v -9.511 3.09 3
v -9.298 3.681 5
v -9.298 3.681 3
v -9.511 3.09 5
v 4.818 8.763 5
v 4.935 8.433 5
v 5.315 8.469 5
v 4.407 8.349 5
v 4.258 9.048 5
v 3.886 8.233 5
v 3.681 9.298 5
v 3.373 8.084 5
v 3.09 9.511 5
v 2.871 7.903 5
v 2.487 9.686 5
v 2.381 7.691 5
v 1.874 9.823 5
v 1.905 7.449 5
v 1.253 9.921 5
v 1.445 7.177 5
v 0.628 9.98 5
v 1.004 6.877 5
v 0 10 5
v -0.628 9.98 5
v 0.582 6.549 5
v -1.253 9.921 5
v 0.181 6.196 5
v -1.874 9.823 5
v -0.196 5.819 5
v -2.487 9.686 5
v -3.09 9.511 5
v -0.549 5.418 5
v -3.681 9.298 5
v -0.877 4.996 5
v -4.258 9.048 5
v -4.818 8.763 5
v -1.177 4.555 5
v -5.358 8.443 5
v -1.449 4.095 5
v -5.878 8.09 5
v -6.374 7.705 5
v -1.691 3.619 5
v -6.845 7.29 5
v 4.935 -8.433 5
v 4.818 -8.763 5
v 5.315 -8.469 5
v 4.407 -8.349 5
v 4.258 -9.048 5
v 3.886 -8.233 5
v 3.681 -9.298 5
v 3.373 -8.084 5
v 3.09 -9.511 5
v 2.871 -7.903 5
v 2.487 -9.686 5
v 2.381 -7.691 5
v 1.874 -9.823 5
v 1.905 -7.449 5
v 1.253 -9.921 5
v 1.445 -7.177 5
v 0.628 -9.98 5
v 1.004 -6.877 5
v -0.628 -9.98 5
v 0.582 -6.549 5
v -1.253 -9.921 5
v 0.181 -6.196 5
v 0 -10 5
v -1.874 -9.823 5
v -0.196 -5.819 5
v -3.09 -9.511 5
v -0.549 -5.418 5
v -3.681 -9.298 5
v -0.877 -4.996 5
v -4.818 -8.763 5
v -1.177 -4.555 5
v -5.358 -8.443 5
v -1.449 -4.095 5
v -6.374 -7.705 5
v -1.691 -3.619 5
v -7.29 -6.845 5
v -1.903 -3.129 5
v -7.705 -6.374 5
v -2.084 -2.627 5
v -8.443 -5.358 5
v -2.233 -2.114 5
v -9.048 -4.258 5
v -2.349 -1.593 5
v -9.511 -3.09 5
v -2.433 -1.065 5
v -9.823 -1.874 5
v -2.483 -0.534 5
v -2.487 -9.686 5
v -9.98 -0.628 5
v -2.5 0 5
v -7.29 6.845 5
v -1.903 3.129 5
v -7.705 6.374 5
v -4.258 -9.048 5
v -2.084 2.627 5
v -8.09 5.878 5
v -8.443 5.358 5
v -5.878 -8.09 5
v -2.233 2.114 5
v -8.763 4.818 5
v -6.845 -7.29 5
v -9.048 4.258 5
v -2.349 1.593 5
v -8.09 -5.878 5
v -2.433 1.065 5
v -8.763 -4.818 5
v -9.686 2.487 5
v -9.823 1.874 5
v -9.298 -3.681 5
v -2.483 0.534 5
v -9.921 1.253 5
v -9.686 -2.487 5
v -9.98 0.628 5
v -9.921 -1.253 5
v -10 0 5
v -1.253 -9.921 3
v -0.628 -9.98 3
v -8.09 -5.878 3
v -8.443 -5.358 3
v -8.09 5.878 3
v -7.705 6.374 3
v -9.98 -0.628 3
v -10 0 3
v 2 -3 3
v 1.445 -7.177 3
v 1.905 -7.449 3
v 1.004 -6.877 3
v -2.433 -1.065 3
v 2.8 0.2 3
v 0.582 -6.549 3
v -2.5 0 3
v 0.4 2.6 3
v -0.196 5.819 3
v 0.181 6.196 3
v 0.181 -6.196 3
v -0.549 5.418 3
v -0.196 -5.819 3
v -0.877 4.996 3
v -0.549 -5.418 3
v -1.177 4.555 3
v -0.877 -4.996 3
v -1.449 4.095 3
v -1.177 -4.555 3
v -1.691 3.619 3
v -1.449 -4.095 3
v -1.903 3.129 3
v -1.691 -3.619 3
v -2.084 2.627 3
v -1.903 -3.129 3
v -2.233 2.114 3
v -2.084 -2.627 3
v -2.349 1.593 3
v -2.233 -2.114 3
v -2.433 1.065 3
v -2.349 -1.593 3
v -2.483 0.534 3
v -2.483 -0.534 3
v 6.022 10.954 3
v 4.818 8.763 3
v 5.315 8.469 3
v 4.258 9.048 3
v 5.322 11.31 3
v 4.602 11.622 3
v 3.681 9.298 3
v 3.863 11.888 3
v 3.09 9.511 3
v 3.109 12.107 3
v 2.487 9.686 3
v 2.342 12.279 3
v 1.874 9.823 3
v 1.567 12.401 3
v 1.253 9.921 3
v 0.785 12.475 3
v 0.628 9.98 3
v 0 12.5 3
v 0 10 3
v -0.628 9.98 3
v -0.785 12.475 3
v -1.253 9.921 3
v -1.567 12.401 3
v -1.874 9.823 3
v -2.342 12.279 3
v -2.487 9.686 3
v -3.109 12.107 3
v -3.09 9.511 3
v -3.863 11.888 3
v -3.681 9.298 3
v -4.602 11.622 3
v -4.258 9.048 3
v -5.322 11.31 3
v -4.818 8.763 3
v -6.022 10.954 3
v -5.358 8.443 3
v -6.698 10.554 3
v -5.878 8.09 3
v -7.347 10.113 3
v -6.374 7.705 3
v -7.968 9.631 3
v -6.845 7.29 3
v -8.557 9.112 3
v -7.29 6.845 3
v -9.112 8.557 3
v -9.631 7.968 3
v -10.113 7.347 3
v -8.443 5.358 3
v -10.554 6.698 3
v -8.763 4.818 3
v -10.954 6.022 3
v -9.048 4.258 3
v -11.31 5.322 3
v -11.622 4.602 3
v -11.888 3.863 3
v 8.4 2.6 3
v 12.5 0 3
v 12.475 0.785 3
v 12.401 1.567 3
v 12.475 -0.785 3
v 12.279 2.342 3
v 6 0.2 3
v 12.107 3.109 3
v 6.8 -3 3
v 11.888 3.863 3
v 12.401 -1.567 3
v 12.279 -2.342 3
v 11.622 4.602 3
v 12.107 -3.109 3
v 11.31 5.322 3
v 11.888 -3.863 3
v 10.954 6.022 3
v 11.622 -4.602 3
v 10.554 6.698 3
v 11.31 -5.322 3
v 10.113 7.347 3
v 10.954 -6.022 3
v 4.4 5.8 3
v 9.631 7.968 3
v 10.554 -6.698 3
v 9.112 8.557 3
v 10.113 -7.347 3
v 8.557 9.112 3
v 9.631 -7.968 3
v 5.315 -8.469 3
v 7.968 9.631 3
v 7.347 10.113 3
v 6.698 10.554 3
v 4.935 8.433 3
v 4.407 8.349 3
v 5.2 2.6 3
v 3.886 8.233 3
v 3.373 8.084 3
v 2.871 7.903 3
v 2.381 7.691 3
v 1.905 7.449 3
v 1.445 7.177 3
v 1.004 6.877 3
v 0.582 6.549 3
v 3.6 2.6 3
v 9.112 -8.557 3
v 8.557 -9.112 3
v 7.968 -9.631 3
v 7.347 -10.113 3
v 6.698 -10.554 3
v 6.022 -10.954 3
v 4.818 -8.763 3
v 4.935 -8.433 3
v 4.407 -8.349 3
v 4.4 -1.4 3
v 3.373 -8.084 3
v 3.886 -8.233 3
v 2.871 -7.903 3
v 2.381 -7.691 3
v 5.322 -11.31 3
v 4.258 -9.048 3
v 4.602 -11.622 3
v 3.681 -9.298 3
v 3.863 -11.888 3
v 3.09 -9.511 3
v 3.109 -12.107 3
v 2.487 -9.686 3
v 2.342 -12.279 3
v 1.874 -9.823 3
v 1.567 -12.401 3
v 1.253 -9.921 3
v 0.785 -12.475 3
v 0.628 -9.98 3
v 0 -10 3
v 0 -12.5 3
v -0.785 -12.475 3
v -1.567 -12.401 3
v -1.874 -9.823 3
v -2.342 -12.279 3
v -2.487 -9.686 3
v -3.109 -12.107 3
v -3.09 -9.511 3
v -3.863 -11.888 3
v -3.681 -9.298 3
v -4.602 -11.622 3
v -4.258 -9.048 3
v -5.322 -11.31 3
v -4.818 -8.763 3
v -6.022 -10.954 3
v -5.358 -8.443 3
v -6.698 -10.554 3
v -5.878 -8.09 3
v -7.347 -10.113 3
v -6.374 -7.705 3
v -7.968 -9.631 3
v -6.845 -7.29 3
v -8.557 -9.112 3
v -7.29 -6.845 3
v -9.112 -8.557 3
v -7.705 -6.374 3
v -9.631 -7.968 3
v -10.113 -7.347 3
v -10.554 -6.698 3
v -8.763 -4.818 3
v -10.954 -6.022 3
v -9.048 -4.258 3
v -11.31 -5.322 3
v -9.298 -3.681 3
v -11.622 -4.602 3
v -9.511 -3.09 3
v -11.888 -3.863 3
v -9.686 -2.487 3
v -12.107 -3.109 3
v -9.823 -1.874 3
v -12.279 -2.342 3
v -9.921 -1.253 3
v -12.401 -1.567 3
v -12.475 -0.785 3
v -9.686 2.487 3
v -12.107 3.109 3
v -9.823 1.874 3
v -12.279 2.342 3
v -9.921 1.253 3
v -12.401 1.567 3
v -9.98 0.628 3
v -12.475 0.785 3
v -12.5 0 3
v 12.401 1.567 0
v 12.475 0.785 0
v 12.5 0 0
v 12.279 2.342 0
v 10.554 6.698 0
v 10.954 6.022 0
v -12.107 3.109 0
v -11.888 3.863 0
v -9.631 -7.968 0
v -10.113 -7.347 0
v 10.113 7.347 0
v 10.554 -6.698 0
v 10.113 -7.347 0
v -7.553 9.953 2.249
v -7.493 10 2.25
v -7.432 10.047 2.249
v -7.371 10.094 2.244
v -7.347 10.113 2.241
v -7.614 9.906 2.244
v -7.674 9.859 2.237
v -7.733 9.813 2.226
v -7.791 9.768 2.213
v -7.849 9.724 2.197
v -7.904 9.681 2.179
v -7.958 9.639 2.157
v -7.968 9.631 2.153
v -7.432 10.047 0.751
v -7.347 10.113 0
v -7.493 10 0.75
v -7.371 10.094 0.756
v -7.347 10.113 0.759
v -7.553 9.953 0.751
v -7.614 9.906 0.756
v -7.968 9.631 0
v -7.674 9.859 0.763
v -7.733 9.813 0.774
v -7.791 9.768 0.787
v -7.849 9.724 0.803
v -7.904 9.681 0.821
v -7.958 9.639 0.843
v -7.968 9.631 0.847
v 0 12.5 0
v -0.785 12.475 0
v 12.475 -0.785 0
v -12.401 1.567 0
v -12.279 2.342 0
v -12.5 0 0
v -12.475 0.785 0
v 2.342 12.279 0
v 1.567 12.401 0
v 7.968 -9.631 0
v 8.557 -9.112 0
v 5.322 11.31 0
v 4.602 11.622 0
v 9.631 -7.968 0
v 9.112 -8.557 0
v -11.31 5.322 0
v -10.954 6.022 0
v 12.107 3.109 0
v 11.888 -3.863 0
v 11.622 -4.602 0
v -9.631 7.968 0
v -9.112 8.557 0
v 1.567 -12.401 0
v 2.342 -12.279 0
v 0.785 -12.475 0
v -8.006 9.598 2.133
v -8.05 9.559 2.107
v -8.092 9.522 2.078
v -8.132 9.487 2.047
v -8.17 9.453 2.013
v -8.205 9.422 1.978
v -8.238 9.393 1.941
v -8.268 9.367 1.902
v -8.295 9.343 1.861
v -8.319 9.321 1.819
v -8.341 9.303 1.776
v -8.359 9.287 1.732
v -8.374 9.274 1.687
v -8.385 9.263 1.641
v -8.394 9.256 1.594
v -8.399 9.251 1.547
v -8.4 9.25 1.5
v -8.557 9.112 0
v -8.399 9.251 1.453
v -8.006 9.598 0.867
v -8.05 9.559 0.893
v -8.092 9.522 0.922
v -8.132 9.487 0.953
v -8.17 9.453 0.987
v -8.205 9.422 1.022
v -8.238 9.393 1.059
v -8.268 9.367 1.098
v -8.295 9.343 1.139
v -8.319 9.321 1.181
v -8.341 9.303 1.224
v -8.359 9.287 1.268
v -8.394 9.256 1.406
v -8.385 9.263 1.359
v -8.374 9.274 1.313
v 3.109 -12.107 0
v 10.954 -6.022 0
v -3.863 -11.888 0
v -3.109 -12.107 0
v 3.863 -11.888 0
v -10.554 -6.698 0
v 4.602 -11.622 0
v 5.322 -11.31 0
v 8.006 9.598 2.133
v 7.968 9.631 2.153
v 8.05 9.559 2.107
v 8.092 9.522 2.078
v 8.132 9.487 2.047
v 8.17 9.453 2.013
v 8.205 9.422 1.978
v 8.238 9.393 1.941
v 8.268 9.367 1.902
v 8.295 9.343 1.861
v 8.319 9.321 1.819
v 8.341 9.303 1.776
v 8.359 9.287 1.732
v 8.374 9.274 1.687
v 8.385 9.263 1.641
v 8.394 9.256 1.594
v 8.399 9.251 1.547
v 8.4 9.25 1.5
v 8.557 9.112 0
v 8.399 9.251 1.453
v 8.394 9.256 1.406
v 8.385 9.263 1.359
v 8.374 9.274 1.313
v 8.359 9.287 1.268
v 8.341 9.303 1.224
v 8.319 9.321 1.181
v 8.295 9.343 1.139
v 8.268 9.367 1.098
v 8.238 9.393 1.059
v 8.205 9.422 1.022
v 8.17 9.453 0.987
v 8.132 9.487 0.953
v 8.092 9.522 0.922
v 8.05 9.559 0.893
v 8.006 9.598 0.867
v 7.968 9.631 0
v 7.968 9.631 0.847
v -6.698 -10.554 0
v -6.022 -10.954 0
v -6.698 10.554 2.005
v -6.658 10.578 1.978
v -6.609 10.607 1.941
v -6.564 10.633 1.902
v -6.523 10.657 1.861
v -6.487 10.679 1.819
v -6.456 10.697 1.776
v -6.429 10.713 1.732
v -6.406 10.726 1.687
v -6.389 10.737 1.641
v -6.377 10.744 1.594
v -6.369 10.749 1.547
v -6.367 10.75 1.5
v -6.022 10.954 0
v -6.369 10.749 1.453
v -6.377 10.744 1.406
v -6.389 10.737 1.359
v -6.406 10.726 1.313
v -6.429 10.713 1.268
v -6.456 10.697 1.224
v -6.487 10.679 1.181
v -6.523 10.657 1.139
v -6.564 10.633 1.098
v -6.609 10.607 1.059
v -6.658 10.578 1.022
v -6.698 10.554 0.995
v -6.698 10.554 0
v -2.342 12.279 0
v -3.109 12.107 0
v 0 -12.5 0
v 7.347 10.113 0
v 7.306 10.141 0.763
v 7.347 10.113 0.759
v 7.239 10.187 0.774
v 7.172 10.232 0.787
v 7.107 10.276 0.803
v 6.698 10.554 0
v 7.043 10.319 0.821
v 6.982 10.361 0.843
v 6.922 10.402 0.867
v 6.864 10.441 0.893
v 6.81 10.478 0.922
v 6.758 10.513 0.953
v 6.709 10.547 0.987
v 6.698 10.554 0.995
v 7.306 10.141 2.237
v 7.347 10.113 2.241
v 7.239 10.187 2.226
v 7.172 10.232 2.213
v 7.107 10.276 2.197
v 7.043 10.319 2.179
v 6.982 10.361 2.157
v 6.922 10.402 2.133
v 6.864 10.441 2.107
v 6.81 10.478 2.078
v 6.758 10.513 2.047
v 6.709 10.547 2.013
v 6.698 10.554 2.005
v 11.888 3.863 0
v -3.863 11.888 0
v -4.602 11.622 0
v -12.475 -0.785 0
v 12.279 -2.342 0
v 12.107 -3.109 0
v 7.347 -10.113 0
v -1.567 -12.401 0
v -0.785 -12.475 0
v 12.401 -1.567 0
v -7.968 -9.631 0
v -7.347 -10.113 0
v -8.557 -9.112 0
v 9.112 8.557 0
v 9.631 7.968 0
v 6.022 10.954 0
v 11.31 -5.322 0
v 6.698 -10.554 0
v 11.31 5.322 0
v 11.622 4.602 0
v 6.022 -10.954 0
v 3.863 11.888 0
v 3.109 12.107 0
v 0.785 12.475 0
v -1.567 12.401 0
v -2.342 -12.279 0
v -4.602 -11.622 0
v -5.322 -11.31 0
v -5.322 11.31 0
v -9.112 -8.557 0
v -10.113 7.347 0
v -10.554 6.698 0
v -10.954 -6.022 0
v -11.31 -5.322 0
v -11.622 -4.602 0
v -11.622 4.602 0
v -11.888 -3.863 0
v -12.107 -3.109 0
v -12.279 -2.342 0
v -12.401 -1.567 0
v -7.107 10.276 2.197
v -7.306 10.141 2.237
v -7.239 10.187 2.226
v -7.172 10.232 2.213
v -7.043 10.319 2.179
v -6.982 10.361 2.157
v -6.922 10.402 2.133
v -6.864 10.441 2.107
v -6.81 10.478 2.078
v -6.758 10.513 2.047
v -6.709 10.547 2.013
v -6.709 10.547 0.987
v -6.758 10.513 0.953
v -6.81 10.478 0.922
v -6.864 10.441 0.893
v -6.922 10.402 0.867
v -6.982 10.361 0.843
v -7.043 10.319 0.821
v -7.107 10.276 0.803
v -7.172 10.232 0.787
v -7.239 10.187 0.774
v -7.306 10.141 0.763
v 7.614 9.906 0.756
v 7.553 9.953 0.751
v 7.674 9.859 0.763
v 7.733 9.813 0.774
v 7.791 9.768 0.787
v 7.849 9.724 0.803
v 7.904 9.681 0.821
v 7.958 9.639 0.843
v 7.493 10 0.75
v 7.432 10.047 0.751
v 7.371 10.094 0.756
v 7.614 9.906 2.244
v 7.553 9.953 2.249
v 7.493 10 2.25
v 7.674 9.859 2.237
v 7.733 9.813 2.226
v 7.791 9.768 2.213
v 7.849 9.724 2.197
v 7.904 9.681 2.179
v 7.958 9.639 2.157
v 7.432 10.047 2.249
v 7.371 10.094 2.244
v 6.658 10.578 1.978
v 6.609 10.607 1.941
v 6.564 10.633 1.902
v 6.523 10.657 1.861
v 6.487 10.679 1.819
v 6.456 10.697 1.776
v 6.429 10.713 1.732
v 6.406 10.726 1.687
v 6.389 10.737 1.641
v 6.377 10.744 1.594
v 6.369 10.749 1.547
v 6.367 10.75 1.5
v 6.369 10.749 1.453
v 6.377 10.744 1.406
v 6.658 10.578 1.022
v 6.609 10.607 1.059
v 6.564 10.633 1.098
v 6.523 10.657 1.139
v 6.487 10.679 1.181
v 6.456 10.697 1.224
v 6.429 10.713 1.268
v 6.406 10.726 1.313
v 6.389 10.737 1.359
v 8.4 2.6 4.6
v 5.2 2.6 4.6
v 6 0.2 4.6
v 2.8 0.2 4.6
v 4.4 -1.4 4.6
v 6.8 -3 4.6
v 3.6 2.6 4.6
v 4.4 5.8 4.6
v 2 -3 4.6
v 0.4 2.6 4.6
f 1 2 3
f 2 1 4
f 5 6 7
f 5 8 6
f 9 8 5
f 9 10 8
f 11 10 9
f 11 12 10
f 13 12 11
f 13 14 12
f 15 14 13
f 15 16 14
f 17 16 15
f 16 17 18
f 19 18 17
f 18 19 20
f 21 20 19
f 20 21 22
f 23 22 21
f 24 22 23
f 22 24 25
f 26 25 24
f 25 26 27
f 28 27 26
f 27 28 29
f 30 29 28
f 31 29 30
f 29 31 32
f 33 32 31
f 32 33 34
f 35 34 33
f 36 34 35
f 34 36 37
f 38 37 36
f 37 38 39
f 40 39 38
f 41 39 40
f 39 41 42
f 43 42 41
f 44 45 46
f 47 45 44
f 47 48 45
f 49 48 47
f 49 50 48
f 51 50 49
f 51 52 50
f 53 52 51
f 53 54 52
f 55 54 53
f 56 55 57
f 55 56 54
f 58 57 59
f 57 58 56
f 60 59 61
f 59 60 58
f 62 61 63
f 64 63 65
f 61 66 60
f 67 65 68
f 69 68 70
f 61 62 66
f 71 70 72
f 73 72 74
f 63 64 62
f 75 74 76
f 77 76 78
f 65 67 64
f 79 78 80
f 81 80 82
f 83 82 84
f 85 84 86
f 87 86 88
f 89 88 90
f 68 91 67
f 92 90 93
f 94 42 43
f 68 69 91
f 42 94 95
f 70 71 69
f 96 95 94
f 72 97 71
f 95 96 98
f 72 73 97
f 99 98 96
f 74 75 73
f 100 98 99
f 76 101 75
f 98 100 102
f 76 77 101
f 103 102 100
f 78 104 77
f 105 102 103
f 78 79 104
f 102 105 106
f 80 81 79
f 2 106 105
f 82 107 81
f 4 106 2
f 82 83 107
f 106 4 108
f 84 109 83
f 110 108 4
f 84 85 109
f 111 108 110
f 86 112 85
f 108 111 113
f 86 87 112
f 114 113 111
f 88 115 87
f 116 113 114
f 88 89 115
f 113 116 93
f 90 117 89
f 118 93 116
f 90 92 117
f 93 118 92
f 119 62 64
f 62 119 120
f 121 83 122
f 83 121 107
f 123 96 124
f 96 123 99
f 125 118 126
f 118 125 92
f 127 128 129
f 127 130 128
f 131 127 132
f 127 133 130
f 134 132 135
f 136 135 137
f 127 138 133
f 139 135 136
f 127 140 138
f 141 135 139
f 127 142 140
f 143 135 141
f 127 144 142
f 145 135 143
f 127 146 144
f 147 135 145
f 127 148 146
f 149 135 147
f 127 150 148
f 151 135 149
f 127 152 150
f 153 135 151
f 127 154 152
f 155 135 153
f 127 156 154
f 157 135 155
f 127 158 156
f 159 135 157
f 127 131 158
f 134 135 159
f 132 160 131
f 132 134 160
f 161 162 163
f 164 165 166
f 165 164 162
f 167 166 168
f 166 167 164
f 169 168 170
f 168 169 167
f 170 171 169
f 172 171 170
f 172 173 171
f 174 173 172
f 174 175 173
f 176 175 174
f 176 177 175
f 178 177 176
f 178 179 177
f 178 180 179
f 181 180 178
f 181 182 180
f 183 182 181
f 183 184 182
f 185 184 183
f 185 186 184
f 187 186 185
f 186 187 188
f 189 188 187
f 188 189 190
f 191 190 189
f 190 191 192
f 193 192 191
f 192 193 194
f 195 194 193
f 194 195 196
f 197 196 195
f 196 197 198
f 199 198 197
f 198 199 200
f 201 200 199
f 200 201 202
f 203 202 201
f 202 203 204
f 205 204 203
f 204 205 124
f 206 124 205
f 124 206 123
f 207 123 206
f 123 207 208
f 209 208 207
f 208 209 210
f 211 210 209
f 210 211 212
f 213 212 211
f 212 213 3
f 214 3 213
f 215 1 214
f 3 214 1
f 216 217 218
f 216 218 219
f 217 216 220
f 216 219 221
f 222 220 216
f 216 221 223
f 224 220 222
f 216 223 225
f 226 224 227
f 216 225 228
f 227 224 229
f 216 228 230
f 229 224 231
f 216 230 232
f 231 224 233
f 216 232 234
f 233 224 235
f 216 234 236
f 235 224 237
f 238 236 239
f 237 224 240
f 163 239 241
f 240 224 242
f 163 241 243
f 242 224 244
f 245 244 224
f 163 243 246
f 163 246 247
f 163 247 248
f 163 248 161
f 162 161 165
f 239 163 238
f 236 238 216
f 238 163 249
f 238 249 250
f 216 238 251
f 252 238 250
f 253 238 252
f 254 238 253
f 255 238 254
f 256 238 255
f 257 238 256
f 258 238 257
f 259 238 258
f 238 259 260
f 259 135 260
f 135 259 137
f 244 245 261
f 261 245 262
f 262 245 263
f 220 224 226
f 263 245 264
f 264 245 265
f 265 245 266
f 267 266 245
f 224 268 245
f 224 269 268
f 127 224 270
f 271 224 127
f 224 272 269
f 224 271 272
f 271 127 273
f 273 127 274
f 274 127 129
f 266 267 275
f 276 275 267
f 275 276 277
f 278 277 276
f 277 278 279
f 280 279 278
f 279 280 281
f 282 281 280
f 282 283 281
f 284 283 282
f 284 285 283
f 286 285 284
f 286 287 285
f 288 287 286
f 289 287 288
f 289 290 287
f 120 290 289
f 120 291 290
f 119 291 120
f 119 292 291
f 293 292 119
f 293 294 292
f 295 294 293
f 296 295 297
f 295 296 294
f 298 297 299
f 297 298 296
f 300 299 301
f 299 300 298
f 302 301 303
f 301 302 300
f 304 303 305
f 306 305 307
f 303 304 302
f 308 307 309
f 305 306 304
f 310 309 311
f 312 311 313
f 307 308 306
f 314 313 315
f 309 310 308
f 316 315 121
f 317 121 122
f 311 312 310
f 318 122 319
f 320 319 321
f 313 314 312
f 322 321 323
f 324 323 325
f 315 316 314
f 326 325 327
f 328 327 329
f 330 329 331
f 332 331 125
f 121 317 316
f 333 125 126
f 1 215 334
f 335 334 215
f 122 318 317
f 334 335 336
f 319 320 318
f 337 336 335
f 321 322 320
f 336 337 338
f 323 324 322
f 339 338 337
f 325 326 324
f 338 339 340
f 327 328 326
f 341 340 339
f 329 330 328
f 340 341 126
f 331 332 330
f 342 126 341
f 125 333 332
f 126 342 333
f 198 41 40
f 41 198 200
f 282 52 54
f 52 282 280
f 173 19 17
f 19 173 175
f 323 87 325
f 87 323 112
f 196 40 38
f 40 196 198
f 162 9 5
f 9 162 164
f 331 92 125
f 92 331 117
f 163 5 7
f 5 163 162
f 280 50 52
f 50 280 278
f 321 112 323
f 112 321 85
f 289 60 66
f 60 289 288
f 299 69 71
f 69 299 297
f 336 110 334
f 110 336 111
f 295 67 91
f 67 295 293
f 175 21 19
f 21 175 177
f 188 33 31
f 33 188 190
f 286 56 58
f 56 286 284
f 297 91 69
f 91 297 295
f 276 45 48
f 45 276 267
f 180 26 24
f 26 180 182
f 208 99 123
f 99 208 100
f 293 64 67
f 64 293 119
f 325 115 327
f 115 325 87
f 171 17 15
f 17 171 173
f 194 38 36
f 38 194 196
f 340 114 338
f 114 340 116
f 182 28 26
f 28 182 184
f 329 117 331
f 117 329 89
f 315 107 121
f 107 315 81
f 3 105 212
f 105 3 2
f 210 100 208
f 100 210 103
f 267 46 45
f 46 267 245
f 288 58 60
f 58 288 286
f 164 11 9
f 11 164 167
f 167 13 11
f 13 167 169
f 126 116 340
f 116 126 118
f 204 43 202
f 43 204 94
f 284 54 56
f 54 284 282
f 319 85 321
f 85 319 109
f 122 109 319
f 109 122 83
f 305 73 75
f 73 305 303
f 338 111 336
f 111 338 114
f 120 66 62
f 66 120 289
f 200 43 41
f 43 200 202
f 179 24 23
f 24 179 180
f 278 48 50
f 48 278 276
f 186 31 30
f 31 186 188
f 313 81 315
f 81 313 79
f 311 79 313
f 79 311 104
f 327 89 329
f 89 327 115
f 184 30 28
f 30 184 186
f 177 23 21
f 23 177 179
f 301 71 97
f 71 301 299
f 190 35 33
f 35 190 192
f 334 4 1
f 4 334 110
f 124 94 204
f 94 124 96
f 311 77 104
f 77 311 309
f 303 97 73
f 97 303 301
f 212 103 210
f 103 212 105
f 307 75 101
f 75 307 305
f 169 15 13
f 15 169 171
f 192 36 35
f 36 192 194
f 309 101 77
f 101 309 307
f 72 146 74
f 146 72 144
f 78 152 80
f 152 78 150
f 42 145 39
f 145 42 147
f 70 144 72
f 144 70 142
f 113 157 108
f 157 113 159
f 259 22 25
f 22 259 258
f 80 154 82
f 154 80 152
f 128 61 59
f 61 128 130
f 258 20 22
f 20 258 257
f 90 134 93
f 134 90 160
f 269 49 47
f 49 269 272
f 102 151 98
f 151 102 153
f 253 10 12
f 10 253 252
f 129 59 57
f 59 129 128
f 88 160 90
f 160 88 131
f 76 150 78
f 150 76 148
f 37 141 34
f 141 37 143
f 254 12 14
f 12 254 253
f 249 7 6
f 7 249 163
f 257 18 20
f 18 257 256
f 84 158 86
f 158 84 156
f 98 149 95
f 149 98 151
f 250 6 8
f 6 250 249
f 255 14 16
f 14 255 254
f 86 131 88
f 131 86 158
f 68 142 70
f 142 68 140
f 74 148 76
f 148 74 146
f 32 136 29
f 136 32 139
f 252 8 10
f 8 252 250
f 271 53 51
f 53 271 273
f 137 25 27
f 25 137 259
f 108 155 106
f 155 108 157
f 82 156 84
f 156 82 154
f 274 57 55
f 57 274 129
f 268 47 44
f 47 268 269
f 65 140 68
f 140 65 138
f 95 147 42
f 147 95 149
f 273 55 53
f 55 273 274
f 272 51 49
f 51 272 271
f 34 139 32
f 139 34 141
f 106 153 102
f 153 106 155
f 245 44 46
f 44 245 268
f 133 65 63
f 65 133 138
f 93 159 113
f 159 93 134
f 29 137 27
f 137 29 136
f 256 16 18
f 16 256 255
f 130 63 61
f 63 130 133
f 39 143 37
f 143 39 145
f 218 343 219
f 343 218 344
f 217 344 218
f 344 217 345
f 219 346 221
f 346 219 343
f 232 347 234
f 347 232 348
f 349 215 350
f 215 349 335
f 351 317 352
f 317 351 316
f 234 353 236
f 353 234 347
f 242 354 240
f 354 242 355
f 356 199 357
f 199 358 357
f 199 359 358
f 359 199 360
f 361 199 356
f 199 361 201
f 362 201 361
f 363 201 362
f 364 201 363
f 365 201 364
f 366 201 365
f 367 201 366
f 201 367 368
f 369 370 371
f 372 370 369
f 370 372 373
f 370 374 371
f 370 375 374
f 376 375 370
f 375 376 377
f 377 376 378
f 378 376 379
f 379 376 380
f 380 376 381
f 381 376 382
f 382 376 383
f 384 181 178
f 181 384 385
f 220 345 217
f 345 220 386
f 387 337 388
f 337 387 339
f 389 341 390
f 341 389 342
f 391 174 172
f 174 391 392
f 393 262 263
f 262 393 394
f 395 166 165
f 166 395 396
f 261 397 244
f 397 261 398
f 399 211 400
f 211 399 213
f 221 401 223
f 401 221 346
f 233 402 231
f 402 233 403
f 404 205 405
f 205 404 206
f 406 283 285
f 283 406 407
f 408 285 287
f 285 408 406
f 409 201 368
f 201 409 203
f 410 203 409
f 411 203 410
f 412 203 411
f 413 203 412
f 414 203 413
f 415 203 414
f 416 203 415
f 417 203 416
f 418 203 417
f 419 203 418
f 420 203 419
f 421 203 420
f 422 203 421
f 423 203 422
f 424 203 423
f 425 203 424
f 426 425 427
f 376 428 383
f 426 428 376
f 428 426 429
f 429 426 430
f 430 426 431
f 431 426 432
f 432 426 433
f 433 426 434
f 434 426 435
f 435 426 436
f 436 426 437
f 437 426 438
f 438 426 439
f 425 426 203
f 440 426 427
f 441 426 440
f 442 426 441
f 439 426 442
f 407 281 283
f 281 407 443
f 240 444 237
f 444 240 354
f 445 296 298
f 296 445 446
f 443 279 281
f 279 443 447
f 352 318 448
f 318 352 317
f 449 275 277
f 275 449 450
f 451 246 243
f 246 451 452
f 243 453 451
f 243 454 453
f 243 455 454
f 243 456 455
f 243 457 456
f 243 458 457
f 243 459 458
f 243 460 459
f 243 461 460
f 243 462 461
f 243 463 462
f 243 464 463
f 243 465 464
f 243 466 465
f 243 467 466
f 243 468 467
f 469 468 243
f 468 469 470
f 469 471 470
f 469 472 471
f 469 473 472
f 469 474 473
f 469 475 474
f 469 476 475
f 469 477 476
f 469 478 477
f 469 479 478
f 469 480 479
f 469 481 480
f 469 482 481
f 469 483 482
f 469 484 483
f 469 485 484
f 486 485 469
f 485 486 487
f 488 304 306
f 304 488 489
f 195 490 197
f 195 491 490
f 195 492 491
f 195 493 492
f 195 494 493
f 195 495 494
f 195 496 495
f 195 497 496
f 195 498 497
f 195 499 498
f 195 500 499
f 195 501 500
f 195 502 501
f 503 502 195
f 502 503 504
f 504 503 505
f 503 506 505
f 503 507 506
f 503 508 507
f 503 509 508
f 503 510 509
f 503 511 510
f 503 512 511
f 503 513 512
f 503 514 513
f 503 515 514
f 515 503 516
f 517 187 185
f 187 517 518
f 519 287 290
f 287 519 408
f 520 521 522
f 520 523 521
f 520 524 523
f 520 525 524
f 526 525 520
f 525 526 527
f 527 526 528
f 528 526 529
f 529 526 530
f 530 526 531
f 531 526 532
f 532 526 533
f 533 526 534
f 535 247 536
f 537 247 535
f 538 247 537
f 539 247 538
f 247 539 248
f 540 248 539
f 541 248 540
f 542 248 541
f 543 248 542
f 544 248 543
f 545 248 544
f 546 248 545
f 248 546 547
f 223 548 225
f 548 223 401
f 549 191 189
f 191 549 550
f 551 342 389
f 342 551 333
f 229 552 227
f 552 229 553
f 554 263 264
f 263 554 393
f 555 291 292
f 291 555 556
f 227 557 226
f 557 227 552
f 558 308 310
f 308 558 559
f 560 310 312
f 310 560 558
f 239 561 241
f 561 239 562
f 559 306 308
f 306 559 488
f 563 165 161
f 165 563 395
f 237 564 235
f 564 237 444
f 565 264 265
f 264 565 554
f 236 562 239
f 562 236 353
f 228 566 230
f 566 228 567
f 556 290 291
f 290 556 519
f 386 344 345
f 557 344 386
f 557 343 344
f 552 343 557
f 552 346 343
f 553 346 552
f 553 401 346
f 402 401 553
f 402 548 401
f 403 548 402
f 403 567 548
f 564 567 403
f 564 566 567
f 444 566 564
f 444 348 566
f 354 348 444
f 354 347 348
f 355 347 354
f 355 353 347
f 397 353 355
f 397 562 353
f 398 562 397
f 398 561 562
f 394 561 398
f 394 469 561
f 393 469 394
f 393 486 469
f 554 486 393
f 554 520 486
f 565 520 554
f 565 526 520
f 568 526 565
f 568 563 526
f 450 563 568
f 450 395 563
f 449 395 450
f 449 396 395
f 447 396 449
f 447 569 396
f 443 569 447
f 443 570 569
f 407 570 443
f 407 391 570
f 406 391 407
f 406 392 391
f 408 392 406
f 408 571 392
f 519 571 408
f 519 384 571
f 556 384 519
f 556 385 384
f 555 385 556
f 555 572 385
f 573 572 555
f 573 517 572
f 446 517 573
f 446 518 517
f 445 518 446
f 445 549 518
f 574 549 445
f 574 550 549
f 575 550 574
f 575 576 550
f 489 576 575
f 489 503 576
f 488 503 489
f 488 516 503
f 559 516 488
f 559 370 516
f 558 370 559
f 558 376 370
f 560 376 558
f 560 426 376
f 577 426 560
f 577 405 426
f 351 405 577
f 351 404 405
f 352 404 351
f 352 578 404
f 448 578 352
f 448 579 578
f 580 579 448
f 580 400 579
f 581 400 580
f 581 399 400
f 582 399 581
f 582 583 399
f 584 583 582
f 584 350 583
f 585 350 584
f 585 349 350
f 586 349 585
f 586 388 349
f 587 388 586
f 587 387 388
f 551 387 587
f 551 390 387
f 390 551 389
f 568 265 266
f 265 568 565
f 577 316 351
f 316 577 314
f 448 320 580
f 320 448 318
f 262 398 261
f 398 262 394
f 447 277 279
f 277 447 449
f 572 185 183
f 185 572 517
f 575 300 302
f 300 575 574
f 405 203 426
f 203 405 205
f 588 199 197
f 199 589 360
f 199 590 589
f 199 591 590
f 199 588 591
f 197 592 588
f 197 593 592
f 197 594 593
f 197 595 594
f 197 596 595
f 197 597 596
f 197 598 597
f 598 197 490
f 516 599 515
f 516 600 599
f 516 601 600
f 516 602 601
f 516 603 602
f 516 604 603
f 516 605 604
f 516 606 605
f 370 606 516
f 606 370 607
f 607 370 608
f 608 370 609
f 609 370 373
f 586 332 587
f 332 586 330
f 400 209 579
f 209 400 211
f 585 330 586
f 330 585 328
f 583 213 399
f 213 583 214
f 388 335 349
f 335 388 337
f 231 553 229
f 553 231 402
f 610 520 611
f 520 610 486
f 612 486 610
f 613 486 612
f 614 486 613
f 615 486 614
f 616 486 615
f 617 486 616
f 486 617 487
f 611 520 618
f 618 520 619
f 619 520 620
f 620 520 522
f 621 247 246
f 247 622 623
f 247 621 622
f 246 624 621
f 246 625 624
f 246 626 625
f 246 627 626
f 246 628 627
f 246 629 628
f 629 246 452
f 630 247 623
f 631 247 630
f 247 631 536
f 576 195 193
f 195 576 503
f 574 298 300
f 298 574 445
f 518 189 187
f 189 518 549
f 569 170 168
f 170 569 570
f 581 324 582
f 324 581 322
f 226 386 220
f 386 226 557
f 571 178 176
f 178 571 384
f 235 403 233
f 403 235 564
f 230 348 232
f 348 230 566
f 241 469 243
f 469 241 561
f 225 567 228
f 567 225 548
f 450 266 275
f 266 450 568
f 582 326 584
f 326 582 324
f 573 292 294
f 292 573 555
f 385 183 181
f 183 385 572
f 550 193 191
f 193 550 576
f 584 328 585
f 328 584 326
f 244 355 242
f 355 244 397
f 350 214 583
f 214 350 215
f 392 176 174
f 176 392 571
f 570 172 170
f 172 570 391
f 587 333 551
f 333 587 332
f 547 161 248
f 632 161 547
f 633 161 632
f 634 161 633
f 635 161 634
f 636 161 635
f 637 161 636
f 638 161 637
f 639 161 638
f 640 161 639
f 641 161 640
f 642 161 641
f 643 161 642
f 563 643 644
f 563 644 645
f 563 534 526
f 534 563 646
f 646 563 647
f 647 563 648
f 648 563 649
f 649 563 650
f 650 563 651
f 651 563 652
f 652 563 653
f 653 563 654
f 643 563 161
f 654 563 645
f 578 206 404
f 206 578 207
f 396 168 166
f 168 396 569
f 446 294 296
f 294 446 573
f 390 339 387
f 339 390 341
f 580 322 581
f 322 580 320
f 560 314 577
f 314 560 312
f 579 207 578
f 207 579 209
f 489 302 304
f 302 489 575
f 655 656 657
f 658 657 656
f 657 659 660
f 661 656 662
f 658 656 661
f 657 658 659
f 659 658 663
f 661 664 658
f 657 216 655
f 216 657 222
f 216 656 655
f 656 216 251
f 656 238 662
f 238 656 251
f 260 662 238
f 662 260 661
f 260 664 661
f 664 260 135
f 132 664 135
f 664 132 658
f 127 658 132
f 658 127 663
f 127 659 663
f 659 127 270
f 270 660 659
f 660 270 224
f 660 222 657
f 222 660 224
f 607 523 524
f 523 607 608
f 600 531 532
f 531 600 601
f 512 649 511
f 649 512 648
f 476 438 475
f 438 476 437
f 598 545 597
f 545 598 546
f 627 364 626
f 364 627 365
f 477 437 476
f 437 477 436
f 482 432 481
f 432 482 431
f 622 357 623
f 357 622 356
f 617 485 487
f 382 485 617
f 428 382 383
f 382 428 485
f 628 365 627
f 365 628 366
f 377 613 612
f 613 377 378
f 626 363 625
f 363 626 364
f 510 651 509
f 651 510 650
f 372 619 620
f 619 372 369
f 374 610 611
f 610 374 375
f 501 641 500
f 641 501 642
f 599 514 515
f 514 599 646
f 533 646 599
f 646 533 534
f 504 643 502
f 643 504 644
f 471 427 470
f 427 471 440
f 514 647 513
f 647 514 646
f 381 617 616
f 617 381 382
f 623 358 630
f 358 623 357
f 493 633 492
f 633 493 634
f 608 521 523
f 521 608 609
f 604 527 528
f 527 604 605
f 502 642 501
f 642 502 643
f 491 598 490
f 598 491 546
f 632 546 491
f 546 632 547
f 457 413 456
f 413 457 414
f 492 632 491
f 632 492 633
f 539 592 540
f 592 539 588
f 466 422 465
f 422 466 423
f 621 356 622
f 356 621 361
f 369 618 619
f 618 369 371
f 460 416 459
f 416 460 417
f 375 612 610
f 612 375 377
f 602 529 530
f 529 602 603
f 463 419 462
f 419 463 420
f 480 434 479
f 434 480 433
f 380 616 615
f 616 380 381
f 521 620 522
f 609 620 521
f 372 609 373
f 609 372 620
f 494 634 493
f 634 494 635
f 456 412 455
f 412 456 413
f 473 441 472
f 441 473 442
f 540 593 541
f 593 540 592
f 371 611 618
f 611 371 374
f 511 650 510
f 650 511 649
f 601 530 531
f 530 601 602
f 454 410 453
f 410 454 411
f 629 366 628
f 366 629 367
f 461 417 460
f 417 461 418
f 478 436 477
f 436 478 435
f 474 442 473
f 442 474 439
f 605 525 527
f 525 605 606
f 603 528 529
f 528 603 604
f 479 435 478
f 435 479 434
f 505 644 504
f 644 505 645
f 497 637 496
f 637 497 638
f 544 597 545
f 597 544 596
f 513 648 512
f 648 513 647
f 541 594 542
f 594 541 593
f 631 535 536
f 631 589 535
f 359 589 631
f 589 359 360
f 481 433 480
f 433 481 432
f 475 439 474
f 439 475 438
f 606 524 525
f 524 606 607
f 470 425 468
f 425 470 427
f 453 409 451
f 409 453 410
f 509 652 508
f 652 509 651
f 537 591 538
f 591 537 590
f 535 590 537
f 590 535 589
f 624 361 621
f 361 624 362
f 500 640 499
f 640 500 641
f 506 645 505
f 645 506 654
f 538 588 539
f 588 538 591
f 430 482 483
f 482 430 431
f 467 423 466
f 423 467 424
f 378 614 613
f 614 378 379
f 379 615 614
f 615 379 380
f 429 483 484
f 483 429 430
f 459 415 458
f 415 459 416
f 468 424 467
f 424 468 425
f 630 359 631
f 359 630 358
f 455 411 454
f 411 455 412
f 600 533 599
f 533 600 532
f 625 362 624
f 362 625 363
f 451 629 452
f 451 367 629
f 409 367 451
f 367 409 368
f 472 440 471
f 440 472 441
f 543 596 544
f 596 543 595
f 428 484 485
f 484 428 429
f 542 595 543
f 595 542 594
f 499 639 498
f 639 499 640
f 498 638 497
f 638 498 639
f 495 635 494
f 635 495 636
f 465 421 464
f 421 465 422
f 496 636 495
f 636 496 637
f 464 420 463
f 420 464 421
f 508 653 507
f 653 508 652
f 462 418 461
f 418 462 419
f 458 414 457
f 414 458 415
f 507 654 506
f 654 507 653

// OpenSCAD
/*
Moon Pendant
by Corrinne Casey
Note: This is meant to be strung and worn.
Please scale appropriately.
*/
$fn = 100;
module star(){//star
linear_extrude(2){
    polygon([[0,0],[1,4],[-2,7],[2,7],[3,11],[4,7],[8,7],[5,4],[6,0],[3,2]]);
}
}
//
starscale = .8;
hole = 1.5;
module moonstar(){//creates pendant base
cylinder(d=25,h=3);
translate([0,0,3]){//raised moon
difference(){//moon shape
cylinder(d=20,h=2);
translate([6,0,0]){cylinder(d=17,h=5);}
}
}

translate([2,-3,3]){//moved star
scale([starscale,starscale,starscale]){star();}

}
}





module pendant(){//creates pendant with hole
difference(){//pendant
moonstar();
translate([-15,10,1.5]){ //hole
rotate([0,90,0]){cylinder(d=hole, h=30);}
}
}
}


scale([1,1,1]){//runs module
    pendant();
}
